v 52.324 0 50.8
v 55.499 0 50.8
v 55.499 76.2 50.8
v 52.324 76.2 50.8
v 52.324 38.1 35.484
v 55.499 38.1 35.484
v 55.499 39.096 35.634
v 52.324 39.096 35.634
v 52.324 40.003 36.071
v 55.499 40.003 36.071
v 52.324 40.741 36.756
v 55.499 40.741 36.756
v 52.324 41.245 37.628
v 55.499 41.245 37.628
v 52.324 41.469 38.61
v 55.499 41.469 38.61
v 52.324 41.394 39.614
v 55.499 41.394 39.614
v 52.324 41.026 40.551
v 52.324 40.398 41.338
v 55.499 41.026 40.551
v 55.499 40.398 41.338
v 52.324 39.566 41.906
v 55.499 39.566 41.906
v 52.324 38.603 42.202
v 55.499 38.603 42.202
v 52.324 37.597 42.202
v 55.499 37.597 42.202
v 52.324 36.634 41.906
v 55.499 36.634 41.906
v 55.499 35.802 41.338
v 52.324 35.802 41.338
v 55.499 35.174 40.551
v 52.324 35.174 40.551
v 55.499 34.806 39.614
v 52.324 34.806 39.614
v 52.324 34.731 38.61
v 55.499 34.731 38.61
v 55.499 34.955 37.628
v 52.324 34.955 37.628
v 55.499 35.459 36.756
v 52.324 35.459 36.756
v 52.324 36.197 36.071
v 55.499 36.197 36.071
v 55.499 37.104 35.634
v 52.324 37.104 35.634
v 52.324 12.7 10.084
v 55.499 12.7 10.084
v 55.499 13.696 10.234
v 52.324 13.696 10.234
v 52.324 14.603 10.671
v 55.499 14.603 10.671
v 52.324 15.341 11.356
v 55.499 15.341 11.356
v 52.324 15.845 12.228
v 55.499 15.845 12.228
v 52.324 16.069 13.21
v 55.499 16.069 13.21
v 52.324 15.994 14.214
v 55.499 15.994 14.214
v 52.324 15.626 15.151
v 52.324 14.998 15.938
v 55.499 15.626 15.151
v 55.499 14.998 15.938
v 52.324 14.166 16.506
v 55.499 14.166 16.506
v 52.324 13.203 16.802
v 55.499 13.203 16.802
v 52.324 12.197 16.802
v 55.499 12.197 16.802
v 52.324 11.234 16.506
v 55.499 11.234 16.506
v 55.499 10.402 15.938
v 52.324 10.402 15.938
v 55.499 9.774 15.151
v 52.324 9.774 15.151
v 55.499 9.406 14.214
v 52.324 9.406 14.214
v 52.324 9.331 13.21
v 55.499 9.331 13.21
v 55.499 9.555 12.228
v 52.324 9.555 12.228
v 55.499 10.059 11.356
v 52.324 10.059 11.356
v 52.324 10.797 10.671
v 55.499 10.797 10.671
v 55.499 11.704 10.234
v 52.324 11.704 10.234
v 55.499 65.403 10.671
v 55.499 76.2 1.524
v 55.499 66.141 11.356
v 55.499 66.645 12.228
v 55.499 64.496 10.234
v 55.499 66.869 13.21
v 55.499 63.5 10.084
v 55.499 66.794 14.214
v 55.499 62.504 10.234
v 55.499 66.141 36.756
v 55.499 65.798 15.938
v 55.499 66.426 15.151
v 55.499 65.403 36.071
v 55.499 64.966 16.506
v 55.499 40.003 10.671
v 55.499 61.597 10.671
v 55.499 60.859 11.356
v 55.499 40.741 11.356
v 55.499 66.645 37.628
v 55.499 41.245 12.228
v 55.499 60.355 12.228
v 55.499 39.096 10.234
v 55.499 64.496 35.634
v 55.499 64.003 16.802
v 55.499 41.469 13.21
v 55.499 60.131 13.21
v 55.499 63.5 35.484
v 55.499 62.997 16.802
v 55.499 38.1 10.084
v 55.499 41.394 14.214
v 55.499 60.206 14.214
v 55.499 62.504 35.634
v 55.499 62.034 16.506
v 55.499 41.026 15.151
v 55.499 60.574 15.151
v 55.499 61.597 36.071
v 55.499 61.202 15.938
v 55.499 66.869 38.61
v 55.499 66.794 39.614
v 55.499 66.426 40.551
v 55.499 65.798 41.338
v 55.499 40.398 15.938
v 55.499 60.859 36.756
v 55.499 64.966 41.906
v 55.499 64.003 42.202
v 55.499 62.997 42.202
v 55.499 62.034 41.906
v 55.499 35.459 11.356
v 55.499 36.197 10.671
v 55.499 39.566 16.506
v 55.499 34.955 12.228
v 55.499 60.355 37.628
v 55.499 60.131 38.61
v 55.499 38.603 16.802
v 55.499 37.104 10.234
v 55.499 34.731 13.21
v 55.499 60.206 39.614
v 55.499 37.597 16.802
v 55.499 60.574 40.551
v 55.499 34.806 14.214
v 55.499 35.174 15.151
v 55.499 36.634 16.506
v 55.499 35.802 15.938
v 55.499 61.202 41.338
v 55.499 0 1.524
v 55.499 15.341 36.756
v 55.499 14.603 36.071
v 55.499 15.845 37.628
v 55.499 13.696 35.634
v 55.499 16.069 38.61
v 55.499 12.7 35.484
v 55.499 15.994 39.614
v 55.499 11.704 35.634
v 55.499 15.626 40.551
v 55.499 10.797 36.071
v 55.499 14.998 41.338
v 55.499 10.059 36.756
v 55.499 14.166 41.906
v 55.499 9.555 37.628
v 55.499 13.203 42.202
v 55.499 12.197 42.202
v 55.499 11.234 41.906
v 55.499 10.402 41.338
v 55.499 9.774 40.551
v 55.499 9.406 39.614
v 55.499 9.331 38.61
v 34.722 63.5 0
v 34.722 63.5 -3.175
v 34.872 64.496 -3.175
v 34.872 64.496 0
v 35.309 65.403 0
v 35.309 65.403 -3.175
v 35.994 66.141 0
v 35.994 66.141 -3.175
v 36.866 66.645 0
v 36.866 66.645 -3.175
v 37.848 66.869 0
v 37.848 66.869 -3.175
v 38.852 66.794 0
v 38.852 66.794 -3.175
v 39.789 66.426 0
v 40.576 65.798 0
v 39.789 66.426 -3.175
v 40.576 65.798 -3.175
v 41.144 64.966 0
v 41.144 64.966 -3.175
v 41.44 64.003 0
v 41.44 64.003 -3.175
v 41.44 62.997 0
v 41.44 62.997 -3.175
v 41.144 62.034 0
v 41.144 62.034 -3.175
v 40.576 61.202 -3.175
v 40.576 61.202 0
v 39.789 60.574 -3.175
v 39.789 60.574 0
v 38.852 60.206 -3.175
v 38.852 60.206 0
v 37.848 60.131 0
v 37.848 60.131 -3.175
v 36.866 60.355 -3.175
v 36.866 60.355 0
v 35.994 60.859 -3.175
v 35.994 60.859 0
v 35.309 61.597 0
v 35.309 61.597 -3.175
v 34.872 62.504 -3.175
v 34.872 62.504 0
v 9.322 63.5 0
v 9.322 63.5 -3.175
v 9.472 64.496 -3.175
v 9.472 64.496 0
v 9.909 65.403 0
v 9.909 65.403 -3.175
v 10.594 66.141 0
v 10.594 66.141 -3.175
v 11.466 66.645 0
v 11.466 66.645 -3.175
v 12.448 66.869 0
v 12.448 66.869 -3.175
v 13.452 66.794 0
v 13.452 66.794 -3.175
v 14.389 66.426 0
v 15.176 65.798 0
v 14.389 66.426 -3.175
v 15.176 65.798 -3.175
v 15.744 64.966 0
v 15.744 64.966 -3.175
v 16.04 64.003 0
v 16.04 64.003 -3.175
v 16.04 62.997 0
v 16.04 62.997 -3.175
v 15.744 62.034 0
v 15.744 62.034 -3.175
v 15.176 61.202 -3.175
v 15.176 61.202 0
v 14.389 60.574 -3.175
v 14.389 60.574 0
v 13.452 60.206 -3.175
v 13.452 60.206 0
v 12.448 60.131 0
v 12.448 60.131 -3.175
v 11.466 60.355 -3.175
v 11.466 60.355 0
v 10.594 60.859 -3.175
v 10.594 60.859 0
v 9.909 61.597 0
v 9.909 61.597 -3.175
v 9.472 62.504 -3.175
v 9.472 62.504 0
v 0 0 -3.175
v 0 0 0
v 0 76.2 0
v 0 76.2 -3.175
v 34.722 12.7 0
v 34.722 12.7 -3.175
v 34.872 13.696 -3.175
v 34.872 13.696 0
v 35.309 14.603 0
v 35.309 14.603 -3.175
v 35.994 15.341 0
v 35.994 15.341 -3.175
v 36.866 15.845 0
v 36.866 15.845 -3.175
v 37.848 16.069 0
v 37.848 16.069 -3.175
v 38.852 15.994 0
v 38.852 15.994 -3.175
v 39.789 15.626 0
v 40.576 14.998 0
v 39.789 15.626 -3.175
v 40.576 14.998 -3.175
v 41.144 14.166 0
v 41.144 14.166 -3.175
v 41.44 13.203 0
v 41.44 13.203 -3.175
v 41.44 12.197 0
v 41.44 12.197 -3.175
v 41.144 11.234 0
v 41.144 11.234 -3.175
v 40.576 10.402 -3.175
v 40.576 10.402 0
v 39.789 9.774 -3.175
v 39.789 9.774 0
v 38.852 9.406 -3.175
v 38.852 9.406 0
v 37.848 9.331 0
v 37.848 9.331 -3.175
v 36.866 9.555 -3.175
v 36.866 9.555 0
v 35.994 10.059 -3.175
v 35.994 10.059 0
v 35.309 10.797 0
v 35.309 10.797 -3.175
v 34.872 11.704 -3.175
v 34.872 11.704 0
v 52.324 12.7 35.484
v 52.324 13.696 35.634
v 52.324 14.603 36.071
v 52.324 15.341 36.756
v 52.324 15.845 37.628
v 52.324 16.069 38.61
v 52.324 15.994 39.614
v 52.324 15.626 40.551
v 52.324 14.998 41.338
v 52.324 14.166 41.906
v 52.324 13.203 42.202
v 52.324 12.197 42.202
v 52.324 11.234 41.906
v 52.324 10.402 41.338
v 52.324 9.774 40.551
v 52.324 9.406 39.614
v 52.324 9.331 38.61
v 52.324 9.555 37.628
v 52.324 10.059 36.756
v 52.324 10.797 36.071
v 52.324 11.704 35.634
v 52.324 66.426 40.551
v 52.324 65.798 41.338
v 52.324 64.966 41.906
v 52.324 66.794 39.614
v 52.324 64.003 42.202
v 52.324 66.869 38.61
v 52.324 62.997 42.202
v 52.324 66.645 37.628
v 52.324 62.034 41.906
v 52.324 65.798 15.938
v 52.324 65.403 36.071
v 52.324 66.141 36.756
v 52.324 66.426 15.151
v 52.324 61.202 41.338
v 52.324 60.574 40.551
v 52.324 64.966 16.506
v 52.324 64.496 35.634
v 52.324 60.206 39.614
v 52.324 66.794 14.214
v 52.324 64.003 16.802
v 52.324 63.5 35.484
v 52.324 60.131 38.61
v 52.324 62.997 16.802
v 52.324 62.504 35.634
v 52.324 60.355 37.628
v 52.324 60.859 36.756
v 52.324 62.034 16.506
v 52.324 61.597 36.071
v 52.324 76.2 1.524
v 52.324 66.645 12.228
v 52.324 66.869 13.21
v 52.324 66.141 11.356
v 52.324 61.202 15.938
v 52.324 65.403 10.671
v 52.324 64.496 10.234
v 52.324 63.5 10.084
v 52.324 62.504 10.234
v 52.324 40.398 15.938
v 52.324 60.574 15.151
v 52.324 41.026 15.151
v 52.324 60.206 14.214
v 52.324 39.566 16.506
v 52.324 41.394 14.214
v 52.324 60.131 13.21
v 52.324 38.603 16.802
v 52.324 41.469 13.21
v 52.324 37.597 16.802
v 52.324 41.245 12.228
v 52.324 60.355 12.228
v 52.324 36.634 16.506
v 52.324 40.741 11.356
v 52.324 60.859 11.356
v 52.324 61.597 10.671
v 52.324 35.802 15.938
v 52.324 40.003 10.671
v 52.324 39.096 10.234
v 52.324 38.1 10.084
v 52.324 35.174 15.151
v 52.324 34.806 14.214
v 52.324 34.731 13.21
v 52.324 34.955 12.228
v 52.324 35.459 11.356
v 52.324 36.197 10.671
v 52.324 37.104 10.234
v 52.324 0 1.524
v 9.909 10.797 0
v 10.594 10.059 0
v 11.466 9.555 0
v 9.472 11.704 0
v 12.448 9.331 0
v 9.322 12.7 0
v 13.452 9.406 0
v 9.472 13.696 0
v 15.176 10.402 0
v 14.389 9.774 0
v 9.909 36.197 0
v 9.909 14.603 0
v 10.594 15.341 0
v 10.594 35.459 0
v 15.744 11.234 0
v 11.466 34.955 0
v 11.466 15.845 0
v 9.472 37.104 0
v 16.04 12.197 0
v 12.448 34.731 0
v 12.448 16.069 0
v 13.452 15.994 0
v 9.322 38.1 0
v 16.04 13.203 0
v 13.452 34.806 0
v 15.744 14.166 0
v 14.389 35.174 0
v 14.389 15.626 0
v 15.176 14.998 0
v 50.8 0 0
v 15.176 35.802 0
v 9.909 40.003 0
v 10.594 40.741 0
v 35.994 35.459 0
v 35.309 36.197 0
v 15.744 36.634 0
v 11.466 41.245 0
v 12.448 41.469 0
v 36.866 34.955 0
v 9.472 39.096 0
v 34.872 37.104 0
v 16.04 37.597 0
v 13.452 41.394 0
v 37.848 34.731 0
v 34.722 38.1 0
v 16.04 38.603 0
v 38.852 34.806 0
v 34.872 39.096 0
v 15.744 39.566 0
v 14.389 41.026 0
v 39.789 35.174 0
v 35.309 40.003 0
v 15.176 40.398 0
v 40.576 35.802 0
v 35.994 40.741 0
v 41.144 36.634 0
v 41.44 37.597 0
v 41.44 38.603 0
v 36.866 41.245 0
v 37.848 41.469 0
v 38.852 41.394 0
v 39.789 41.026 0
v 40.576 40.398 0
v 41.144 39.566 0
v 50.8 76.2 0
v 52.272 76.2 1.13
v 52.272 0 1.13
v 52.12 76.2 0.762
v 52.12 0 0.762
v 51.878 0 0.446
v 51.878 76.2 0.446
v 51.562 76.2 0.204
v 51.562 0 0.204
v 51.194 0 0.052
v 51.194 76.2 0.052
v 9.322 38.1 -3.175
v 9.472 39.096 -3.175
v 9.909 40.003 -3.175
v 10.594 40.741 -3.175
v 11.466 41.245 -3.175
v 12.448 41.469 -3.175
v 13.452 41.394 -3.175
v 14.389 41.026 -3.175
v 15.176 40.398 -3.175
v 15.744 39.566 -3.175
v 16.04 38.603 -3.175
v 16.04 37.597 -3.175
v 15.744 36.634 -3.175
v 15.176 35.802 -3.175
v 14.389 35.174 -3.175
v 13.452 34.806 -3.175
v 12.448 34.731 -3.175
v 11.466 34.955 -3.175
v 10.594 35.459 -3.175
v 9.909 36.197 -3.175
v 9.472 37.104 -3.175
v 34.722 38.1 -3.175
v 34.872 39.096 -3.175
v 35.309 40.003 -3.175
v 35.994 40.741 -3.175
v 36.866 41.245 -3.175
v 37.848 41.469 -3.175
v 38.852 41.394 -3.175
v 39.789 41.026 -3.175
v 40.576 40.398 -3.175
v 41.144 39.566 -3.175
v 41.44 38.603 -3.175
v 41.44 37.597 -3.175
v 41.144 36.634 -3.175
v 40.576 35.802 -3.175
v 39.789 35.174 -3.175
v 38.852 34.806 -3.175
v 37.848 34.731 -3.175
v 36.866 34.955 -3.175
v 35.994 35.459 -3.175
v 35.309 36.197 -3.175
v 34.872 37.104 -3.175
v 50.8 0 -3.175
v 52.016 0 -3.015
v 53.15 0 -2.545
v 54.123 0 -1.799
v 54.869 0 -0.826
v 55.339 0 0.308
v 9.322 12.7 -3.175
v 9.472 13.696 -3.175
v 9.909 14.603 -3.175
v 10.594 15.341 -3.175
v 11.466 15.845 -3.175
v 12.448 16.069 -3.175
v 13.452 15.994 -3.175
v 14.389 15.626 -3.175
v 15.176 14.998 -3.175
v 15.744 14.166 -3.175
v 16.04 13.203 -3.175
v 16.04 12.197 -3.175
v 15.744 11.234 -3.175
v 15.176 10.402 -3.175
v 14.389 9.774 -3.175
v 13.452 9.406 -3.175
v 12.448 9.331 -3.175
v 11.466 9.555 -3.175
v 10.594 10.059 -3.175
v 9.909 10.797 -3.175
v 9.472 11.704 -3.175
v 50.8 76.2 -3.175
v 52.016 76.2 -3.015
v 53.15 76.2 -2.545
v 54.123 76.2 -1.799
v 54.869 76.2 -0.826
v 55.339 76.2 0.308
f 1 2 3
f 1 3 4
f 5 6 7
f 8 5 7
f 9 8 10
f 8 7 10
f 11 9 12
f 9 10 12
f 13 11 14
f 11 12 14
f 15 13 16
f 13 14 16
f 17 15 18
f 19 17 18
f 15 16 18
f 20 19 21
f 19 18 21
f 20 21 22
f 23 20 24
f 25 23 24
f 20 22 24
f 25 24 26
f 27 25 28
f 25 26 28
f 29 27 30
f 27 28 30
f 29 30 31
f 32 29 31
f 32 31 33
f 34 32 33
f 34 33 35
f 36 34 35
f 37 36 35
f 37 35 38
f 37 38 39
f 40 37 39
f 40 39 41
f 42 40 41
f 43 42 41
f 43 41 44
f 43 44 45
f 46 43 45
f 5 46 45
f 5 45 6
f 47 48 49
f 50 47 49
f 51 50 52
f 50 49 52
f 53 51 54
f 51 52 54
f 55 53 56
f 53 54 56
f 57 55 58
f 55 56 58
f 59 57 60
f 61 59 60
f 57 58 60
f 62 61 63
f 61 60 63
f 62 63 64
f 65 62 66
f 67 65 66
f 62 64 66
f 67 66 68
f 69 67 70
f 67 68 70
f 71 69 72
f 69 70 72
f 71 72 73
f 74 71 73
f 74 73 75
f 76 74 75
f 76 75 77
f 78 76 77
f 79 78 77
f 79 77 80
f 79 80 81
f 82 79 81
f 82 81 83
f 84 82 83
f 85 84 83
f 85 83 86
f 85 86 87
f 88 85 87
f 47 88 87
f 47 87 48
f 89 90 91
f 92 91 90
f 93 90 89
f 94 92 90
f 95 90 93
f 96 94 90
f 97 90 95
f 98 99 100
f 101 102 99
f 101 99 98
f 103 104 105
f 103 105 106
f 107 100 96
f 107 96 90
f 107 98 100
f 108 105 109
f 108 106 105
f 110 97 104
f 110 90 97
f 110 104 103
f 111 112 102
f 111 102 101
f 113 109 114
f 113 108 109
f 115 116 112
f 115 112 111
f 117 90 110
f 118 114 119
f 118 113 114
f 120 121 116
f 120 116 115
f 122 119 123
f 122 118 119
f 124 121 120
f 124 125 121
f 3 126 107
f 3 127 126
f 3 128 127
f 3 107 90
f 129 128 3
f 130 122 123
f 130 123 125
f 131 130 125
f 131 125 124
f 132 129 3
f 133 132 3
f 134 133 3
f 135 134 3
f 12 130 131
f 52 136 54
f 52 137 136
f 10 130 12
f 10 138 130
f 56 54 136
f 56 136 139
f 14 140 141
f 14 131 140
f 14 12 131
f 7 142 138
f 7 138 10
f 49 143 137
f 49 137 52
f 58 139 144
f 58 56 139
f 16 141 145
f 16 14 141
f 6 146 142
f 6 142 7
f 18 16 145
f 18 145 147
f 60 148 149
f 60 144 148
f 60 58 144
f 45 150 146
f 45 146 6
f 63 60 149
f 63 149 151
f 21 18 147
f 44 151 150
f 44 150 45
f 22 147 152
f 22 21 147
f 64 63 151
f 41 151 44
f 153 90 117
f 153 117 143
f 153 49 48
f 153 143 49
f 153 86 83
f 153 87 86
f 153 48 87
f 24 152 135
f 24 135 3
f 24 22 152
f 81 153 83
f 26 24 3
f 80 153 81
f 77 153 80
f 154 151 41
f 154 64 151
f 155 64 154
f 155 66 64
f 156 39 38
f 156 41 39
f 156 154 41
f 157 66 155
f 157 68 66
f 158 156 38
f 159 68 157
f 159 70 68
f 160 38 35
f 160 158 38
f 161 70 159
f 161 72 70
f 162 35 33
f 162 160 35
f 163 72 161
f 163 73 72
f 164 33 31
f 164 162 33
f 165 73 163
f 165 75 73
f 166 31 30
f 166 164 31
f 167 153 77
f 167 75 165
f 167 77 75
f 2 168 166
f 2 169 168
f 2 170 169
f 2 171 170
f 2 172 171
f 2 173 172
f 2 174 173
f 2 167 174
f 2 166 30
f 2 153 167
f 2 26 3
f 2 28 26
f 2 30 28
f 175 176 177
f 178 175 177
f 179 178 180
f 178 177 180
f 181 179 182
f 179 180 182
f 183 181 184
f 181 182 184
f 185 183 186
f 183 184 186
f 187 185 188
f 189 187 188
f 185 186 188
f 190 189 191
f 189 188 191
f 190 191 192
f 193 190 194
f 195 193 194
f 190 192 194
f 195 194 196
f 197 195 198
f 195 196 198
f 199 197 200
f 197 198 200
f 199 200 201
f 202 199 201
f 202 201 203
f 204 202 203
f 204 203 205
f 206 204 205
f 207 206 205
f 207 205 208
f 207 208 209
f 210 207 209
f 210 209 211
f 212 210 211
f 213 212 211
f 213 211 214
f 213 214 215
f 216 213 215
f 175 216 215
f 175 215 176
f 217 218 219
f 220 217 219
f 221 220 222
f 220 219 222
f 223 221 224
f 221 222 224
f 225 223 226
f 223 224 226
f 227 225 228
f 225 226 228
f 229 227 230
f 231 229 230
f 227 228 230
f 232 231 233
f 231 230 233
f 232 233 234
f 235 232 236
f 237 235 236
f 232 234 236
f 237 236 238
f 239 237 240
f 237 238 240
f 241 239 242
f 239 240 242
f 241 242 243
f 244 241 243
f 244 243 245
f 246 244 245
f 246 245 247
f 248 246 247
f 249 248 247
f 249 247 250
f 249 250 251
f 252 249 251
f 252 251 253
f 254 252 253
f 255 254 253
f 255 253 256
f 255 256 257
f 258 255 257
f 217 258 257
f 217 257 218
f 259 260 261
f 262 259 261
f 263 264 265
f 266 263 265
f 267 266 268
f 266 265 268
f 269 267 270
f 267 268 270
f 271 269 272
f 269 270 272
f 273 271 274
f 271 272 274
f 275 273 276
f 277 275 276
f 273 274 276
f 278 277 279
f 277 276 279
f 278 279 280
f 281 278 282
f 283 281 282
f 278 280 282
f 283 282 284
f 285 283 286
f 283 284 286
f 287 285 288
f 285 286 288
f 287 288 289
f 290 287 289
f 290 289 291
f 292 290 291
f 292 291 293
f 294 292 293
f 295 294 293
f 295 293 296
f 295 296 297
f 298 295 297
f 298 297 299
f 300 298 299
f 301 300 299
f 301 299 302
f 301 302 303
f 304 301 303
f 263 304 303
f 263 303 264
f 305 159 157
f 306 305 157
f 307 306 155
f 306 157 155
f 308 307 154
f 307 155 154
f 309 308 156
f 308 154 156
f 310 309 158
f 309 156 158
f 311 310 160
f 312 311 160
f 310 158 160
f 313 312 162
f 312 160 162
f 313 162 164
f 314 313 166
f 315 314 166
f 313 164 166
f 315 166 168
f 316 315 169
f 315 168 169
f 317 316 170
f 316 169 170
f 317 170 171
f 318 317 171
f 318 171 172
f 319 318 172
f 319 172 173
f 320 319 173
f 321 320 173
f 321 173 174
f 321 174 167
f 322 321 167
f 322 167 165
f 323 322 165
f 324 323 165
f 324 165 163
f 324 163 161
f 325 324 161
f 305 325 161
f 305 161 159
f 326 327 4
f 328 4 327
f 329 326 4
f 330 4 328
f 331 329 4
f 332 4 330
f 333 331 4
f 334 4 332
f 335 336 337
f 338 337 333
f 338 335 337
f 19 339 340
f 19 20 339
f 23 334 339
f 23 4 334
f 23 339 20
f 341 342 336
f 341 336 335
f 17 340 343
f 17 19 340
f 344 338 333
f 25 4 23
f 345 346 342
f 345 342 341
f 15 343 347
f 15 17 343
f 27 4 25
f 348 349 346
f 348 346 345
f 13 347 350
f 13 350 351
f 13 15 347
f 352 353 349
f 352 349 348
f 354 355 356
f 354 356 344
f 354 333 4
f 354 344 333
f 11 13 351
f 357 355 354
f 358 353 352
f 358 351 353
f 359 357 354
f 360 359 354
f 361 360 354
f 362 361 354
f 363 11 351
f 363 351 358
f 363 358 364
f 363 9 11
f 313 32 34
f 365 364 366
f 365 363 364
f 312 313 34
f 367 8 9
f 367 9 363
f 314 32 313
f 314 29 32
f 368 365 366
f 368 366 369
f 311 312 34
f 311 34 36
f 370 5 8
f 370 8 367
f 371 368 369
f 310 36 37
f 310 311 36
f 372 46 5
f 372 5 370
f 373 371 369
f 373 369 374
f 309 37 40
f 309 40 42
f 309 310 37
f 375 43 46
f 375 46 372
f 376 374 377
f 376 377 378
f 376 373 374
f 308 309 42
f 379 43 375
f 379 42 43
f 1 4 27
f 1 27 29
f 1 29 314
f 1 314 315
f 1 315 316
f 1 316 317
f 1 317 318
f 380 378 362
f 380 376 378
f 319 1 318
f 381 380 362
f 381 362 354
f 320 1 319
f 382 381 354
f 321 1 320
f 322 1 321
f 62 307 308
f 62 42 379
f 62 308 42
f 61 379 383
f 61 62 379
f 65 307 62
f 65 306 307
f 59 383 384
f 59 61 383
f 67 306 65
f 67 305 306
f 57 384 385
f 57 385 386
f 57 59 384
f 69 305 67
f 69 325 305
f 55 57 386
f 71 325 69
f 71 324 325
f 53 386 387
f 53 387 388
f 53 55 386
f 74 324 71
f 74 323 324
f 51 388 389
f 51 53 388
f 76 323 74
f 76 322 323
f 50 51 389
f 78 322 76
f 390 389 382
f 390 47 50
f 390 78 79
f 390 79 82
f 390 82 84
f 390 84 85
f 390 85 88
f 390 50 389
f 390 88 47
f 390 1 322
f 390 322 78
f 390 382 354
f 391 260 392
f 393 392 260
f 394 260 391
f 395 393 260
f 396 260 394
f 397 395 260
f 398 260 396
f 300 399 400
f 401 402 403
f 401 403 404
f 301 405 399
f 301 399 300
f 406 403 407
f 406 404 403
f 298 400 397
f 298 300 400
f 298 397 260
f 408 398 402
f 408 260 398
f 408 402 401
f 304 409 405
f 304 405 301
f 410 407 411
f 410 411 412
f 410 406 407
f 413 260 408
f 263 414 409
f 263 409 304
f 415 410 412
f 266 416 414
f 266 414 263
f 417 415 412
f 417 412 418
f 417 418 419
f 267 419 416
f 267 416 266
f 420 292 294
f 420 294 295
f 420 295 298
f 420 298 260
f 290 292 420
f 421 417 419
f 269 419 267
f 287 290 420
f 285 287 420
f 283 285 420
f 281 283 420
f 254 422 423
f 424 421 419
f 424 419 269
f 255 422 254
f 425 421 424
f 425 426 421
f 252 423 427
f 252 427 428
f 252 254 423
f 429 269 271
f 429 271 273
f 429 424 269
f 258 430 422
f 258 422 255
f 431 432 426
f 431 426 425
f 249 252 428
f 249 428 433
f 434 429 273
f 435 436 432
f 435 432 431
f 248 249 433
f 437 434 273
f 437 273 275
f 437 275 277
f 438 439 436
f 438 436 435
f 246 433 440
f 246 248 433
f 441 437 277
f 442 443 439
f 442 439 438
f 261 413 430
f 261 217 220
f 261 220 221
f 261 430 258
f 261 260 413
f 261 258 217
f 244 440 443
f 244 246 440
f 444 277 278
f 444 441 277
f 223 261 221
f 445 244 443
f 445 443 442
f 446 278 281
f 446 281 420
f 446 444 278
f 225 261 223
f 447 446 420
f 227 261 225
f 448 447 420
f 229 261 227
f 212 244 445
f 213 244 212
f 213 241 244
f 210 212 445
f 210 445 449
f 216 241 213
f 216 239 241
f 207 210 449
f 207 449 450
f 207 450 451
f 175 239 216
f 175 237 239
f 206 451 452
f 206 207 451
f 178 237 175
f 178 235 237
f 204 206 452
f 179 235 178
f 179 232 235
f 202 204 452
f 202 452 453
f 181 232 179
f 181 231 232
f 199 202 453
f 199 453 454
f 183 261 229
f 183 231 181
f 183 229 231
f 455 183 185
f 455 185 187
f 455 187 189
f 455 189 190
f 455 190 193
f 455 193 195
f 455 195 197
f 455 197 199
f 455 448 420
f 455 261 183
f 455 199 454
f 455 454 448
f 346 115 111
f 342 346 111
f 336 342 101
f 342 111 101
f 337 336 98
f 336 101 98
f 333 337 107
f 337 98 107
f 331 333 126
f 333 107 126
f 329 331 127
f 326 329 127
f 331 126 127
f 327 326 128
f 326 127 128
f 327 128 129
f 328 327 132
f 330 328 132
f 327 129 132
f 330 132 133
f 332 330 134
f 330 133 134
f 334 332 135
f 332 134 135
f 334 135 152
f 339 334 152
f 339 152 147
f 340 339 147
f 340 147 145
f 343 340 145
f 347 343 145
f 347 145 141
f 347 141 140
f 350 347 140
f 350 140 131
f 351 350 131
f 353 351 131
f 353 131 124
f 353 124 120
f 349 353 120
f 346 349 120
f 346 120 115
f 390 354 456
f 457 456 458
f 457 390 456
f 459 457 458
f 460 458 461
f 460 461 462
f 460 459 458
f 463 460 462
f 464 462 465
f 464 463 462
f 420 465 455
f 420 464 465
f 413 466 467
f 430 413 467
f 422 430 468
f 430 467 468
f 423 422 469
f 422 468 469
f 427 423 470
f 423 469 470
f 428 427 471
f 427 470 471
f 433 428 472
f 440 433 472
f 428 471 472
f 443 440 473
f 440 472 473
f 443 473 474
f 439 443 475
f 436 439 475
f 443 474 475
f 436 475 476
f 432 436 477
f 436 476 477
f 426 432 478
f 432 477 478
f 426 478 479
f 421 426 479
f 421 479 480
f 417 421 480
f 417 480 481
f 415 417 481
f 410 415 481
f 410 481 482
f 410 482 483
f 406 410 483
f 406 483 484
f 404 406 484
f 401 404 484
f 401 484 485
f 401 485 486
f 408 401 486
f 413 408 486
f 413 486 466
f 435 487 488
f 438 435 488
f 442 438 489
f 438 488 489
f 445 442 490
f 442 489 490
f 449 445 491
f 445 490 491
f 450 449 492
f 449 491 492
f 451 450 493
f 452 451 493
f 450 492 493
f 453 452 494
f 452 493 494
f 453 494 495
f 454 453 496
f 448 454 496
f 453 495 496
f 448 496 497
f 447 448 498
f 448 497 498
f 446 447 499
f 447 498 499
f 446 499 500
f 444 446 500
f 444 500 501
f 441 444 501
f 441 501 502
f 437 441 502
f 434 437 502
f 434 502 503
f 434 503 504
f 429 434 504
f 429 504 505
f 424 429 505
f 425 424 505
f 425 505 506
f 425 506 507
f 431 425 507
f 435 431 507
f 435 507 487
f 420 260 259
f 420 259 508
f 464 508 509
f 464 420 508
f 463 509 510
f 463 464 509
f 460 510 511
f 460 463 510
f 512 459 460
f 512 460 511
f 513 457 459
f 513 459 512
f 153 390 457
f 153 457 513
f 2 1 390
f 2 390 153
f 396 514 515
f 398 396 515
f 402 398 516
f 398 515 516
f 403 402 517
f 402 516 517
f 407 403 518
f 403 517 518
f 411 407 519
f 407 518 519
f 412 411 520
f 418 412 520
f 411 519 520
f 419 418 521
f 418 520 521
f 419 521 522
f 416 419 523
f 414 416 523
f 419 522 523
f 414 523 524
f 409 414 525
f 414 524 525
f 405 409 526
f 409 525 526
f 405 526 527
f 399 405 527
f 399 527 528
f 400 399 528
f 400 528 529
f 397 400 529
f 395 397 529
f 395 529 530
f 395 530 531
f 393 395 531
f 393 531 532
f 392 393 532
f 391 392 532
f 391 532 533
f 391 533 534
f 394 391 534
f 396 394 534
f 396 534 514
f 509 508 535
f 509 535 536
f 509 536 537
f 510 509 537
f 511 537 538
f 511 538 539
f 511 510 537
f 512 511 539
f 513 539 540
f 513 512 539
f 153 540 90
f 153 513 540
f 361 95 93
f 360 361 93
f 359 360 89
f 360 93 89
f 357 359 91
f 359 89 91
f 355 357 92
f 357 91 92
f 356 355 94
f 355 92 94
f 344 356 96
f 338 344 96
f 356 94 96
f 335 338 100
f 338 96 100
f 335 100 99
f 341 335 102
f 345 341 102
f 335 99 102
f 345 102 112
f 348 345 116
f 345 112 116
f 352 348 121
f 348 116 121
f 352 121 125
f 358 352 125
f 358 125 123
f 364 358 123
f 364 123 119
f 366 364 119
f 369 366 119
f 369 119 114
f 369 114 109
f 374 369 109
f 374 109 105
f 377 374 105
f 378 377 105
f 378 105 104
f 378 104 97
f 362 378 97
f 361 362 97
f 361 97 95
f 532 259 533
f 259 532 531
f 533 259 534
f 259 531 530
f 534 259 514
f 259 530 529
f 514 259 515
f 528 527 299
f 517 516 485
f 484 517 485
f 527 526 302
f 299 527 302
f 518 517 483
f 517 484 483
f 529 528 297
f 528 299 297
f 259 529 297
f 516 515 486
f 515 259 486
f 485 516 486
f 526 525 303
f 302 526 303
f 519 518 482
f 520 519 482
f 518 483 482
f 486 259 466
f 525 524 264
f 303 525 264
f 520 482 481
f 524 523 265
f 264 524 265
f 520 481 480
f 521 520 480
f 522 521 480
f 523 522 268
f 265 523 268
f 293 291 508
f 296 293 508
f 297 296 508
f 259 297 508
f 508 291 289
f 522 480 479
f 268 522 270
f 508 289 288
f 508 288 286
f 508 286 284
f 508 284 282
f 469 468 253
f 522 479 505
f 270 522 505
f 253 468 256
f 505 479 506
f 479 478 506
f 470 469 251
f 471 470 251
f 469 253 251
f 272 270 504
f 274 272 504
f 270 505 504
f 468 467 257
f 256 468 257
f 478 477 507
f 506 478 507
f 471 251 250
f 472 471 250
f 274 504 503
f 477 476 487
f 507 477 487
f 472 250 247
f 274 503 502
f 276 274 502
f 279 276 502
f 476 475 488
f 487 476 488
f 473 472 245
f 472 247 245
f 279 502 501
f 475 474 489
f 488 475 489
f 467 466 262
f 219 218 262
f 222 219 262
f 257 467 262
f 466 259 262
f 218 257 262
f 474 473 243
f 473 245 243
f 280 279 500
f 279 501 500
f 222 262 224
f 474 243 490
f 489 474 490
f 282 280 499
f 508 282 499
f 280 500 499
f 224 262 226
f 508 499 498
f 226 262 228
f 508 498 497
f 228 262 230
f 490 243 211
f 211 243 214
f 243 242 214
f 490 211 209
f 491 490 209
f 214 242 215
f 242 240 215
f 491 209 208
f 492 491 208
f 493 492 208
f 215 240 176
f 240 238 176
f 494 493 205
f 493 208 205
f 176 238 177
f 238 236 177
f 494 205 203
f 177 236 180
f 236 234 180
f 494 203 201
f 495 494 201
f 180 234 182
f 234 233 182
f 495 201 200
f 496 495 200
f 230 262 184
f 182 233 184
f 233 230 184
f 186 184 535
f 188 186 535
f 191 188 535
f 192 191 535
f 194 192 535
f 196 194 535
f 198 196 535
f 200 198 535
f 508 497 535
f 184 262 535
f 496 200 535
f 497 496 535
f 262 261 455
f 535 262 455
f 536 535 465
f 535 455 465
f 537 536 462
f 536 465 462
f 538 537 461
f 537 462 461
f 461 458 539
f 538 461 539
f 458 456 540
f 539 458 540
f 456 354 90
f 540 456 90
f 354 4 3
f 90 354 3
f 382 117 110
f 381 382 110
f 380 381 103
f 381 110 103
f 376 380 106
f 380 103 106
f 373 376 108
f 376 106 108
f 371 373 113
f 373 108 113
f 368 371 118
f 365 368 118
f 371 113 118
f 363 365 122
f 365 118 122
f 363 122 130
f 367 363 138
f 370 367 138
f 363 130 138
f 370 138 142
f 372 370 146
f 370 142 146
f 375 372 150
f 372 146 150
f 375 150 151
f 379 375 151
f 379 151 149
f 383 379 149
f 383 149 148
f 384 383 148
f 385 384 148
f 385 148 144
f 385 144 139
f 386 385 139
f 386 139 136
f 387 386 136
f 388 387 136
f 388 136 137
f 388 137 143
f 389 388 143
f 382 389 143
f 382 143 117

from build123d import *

# Parameters (mm, degrees)
SKETCH1_W               = 50.8
SKETCH1_H               = 76.2
BASE_FLANGE1_DEPTH      = 3.175
EDGE_FLANGE1_DEPTH      = 76.2
F_1_4_CLEARANCE_HOLE1_D = 6.7564
F_1_4_CLEARANCE_HOLE2_D = 6.7564


# Sheet-metal steps are written as plain solids
with BuildPart() as part:
    # Sketch1 → Base-Flange1 (new body)
    with BuildSketch(Plane.XY):
        with Locations((25.4, 38.1)):
            Rectangle(SKETCH1_W, SKETCH1_H)
    extrude(amount=-BASE_FLANGE1_DEPTH)

    # Edge-Flange1 section (across the edge) → Edge-Flange1 (add)
    with BuildSketch(Plane(origin=(52.324, 0, 0), x_dir=(-1, 0, 0), z_dir=(0, 1, 0))):
        with BuildLine():
            Line((-3.175, 1.524), (-3.175, 50.8))
            Line((-3.175, 50.8), (0, 50.8))
            Line((0, 50.8), (0, 1.524))
            ThreePointArc((0, 1.524), (0.446369265, 0.446369265), (1.524, 0))
            Line((1.524, 0), (1.524, -3.175))
            ThreePointArc((1.524, -3.175), (-1.798694765, -1.798694765), (-3.175, 1.524))
        make_face()
    extrude(amount=EDGE_FLANGE1_DEPTH)

    # 1/4 Clearance Hole1 (through all)
    with Locations(Plane.XY):
        with Locations((38.1, 63.5), (12.7, 63.5), (12.7, 38.1), (38.1, 38.1), (12.7, 12.7), (38.1, 12.7)):
            Hole(F_1_4_CLEARANCE_HOLE1_D / 2)

    # 1/4 Clearance Hole2 (through all)
    with Locations(Plane.ZY.offset(-52.324)):
        with Locations((13.462, 63.5), (38.862, 63.5), (13.462, 38.1), (38.862, 38.1), (13.462, 12.7), (38.862, 12.7)):
            Hole(F_1_4_CLEARANCE_HOLE2_D / 2)


solid = part.part
